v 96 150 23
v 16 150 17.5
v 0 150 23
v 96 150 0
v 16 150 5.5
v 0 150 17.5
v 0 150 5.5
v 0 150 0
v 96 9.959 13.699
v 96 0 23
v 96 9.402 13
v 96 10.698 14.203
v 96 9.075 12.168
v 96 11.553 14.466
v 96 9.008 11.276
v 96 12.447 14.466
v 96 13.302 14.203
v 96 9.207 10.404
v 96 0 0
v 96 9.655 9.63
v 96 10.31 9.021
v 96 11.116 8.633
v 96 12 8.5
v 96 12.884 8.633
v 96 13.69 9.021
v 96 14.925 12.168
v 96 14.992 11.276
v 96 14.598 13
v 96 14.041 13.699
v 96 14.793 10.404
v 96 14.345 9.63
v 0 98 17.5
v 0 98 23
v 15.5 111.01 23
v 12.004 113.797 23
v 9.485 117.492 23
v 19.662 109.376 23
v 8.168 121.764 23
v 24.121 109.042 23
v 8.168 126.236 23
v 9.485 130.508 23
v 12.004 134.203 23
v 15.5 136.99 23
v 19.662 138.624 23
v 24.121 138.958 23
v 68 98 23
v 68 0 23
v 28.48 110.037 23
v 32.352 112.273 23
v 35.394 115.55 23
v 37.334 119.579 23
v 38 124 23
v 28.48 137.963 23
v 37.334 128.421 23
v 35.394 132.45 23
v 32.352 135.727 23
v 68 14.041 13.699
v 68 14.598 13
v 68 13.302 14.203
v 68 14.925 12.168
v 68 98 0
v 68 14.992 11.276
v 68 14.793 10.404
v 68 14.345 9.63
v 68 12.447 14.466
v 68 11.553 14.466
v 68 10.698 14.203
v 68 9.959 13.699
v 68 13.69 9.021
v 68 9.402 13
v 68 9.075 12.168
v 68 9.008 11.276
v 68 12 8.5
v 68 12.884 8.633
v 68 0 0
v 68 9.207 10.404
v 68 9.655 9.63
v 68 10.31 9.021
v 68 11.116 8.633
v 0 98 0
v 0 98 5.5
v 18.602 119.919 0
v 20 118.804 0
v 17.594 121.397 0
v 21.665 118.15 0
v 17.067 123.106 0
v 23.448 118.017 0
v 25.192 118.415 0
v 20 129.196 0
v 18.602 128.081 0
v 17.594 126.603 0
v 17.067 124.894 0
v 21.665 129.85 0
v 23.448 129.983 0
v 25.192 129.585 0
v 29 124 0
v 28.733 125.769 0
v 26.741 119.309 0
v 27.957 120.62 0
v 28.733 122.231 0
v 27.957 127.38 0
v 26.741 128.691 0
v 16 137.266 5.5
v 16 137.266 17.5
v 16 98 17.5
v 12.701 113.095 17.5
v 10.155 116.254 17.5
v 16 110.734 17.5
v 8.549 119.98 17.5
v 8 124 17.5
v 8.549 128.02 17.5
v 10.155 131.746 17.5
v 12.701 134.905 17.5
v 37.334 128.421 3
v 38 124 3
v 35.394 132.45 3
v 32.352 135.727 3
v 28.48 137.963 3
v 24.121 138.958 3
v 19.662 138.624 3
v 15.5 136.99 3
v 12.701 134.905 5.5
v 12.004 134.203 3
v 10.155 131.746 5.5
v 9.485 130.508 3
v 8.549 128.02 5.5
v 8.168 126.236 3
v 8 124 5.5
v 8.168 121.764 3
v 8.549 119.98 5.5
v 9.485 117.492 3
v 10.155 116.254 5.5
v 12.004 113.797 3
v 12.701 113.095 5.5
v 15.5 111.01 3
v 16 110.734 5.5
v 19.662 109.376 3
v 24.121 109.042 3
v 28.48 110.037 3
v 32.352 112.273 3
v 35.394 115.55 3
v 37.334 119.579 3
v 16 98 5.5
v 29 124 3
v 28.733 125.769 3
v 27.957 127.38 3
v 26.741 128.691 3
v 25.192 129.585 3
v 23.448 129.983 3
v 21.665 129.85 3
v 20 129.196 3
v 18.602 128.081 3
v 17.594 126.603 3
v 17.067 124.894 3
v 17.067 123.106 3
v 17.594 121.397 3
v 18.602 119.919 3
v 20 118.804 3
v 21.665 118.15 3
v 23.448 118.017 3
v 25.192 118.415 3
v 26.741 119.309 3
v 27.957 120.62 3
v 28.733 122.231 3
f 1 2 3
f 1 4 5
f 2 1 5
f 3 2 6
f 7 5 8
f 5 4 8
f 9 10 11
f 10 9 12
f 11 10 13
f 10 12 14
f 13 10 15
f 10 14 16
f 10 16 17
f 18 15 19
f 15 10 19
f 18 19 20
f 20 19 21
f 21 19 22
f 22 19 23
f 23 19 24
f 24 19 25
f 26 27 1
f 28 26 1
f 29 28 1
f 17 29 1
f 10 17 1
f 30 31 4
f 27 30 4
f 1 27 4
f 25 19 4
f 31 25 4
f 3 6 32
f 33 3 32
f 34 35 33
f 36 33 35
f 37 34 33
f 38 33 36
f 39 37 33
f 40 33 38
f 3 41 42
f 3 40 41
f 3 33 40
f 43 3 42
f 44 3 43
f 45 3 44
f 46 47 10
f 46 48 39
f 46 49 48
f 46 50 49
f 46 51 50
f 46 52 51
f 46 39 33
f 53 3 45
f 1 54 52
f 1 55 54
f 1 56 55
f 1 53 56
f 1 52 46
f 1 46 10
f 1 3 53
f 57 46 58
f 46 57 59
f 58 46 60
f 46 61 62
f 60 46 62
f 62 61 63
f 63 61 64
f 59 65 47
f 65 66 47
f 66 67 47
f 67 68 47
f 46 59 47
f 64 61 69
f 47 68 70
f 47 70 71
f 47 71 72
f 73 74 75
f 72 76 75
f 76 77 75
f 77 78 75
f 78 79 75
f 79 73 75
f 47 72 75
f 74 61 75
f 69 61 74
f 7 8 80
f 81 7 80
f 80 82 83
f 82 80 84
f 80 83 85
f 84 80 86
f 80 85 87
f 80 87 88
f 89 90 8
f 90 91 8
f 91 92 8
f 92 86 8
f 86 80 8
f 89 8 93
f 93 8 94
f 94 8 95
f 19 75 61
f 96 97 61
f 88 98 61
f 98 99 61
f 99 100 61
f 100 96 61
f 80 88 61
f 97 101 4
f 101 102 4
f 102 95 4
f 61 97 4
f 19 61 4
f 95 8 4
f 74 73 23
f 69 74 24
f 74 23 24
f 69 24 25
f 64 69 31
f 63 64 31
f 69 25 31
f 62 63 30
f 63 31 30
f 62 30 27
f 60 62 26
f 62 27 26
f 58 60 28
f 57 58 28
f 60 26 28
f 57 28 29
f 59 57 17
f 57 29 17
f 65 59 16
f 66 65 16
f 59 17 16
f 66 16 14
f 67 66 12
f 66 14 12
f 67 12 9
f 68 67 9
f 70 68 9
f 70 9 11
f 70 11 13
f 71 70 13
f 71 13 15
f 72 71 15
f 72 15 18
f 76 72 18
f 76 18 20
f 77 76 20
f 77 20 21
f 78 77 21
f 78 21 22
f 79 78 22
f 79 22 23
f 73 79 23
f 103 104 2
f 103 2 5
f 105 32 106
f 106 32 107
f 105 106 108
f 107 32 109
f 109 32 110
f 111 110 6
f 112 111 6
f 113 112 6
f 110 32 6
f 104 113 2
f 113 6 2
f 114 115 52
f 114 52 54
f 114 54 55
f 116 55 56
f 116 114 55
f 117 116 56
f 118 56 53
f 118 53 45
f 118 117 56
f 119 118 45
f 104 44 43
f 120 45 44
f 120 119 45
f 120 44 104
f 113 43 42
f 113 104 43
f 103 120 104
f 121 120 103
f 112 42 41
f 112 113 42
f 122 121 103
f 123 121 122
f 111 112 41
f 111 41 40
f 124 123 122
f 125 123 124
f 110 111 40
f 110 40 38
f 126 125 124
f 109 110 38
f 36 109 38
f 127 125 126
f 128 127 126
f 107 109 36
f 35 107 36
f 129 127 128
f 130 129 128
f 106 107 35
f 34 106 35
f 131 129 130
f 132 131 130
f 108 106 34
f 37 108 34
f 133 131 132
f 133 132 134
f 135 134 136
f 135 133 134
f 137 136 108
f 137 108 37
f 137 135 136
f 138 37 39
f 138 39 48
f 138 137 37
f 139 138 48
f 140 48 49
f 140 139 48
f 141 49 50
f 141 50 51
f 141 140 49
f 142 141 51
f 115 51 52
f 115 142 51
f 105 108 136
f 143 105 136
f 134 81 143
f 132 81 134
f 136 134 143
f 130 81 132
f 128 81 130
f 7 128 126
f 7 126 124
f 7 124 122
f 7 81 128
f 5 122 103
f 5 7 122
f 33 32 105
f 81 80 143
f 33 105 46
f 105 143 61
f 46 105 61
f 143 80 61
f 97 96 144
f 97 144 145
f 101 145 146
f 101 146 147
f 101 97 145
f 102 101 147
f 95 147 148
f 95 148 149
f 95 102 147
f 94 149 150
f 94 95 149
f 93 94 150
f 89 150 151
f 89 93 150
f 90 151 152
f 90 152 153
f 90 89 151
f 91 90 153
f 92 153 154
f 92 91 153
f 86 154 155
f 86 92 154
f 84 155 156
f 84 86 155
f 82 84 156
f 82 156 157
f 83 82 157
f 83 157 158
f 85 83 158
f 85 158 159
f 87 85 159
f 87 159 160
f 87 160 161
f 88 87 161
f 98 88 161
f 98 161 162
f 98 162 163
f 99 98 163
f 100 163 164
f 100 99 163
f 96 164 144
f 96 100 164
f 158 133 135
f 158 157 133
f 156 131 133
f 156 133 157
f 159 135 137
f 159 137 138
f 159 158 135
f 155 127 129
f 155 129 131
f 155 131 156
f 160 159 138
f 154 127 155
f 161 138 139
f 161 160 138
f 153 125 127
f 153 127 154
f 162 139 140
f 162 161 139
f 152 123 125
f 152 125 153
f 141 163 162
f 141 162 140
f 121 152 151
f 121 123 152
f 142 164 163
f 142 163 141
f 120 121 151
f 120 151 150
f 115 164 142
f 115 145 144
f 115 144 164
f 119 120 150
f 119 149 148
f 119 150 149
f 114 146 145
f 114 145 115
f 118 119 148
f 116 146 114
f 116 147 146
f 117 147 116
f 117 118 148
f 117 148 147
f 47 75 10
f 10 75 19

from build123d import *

# Parameters (mm, degrees)
SKETCH1_R           = 15
BOSS_EXTRUDE1_DEPTH = 23
SKETCH1_3_R         = 15
SKETCH1_3_R_2       = 6
BOSS_EXTRUDE2_DEPTH = 3
CUT_EXTRUDE1_REACH  = 181.569
SKETCH2_W           = 16
SKETCH2_H           = 12
CUT_EXTRUDE2_REACH  = 181.569
SKETCH3_R           = 3


with BuildPart() as part:
    # Sketch1 → Boss-Extrude1 (new body)
    with BuildSketch(Plane.XY):
        Polygon((0, 98), (68, 98), (68, 0), (96, 0), (96, 150), (0, 150), align=None)
        with Locations((23, 124)):
            Circle(SKETCH1_R, mode=Mode.SUBTRACT)
    extrude(amount=BOSS_EXTRUDE1_DEPTH)

    # Sketch1<3> → Boss-Extrude2 (add)
    with BuildSketch(Plane.XY):
        with Locations((23, 124)):
            Circle(SKETCH1_3_R)
        with Locations((23, 124)):
            Circle(SKETCH1_3_R_2, mode=Mode.SUBTRACT)
    extrude(amount=BOSS_EXTRUDE2_DEPTH)

    # Sketch2 → Cut-Extrude1 (cut, up to next)
    with BuildSketch(Plane(origin=(0, 150, 0), x_dir=(1, 0, 0), z_dir=(0, 1, 0)), mode=Mode.PRIVATE) as cut_extrude1_sk1:
        with Locations((8, -11.5)):
            Rectangle(SKETCH2_W, SKETCH2_H)
    cut_extrude1_tool1 = extrude(cut_extrude1_sk1.sketch, amount=-CUT_EXTRUDE1_REACH, mode=Mode.PRIVATE) & part.part
    add(cut_extrude1_tool1.solids().sort_by_distance((8, 150, 11.5))[0], mode=Mode.SUBTRACT)

    # Sketch3 → Cut-Extrude2 (cut, up to next)
    with BuildSketch(Plane(origin=(96, 0, 0), x_dir=(0, 0, -1), z_dir=(1, 0, 0)), mode=Mode.PRIVATE) as cut_extrude2_sk1:
        with Locations((-11.5, 12)):
            Circle(SKETCH3_R)
    cut_extrude2_tool1 = extrude(cut_extrude2_sk1.sketch, amount=-CUT_EXTRUDE2_REACH, mode=Mode.PRIVATE) & part.part
    add(cut_extrude2_tool1.solids().sort_by_distance((96, 12, 11.5))[0], mode=Mode.SUBTRACT)


solid = part.part
